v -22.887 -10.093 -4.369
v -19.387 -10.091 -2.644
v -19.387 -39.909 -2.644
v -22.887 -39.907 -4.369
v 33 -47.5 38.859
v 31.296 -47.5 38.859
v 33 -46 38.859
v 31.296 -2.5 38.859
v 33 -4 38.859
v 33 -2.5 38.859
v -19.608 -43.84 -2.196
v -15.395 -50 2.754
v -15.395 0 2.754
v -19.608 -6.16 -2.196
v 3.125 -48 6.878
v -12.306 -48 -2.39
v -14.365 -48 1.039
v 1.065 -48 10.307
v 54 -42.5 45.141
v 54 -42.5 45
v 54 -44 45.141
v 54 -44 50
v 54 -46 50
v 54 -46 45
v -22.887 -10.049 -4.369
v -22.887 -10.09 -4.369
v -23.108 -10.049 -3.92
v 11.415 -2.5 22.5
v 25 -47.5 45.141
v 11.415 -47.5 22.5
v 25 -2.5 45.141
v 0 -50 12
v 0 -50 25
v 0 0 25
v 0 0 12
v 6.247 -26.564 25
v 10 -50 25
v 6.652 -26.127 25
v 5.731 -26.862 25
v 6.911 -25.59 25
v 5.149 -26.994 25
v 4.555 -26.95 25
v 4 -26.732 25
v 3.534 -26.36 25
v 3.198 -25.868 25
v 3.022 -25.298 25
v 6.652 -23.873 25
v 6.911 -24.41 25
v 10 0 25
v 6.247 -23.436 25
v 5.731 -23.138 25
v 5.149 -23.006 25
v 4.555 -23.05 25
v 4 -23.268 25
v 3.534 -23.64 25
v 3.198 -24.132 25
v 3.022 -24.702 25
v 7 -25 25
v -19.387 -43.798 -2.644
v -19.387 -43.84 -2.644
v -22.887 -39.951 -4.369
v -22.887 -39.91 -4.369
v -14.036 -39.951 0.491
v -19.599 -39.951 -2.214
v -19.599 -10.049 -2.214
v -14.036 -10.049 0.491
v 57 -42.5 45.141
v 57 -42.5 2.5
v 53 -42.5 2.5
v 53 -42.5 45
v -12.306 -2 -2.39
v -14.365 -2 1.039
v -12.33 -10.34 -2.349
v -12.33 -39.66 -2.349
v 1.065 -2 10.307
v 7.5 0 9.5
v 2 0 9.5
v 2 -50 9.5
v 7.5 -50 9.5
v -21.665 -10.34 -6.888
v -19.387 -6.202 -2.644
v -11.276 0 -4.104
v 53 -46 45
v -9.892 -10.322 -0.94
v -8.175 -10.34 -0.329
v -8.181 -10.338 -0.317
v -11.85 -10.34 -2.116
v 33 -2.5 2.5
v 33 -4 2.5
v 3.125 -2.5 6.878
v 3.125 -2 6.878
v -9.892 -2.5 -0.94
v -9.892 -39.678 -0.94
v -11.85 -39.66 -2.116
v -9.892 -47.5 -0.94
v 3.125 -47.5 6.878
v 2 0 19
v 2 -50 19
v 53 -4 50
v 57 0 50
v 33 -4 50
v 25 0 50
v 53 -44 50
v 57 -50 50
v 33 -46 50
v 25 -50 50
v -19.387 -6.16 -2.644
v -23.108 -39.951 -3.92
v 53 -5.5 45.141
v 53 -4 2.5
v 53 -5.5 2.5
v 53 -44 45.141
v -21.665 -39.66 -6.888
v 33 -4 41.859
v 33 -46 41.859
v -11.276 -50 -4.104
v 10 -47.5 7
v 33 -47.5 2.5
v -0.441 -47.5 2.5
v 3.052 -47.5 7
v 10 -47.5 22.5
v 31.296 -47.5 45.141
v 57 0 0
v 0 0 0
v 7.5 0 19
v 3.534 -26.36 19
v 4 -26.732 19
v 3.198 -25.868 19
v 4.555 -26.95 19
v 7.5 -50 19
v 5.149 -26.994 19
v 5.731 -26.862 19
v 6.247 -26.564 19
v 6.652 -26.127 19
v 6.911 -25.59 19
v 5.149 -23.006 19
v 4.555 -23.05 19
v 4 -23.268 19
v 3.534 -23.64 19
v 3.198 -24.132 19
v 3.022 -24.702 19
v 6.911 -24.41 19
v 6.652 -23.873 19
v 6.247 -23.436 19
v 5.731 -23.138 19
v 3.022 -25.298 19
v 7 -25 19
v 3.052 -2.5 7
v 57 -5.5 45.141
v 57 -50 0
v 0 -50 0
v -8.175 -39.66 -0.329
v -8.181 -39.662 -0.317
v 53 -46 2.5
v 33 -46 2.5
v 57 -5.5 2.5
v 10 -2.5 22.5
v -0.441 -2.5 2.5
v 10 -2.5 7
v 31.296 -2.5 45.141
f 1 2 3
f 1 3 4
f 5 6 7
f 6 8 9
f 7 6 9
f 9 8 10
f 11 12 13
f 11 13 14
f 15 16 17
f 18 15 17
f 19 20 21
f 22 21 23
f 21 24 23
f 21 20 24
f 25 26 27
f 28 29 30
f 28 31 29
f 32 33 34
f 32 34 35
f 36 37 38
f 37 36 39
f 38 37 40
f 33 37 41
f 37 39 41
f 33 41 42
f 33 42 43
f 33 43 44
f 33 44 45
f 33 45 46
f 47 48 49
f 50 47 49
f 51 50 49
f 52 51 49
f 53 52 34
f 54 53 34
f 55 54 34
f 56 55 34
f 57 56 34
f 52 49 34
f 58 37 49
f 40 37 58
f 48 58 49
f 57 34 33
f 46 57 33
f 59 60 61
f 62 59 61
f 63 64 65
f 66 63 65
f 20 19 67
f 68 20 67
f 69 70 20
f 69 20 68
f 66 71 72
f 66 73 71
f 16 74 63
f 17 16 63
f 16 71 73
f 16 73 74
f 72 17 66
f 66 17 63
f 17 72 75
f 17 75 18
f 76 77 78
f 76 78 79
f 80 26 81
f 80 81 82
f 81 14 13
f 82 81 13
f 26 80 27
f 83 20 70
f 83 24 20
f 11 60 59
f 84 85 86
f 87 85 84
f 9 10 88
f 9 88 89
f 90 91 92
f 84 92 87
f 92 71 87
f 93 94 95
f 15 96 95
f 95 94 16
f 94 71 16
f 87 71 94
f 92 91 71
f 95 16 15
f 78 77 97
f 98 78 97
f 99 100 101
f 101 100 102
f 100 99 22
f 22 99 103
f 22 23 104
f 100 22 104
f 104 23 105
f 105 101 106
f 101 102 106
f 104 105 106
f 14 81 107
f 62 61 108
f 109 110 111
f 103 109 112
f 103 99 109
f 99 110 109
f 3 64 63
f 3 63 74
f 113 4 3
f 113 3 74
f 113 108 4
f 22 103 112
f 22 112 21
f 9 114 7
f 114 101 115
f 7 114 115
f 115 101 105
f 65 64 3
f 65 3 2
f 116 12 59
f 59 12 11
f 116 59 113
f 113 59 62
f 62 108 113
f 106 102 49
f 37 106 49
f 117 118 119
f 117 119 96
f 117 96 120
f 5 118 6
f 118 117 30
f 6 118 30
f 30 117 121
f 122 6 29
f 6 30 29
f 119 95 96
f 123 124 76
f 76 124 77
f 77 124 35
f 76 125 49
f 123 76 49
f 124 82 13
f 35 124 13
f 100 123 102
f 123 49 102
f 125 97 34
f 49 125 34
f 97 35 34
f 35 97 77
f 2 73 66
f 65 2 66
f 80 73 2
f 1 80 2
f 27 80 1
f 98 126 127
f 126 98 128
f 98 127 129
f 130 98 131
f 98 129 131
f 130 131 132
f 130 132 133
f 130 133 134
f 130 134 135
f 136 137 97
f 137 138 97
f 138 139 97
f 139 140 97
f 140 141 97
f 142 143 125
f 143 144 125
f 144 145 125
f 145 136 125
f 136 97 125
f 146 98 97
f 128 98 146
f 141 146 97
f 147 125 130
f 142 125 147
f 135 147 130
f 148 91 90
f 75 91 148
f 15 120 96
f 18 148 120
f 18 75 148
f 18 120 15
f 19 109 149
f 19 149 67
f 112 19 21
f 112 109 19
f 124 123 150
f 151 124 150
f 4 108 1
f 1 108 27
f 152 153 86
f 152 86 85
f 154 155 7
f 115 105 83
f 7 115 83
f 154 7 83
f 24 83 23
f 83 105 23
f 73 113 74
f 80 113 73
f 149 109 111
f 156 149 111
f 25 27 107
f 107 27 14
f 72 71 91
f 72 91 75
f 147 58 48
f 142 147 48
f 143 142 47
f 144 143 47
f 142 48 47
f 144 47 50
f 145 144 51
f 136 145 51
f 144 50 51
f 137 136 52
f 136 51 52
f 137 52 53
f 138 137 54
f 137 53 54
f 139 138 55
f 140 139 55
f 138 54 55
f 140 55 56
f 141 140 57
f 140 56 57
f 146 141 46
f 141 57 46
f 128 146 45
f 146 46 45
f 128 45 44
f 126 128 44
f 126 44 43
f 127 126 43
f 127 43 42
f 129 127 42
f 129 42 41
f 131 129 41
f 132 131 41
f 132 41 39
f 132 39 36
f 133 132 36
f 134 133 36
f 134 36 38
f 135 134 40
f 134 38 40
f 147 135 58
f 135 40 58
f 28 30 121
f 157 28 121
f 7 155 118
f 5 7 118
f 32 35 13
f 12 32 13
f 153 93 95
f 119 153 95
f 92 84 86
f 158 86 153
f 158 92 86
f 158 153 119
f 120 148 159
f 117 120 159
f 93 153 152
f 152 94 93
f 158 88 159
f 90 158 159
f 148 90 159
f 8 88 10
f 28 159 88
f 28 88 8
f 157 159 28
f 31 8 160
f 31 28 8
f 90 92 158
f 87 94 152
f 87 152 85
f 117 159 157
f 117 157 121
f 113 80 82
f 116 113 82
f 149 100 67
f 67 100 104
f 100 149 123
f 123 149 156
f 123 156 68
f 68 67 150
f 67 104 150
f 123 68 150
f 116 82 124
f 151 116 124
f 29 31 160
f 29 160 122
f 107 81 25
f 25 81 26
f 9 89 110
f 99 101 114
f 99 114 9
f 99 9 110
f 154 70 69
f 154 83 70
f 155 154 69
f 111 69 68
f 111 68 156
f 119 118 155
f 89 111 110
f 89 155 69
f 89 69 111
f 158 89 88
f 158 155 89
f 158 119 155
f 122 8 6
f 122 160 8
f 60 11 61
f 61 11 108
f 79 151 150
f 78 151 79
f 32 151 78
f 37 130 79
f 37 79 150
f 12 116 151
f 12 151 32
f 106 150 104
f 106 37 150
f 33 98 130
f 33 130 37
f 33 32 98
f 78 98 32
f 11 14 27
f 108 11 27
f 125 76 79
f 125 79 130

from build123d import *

# Parameters (mm, degrees)
F0_W      = 5.5
F0_H      = 9.5
F1_DEPTH  = 50
F2_T      = -2.5
F3_W      = 46
F3_H      = 4
F4_DEPTH  = 18
F5_DEPTH  = 30
F6_W      = 2
F6_H      = 3
F7_DEPTH  = 42.640873421
F8_W      = 20
F8_H      = 42
F9_DEPTH  = 4.859126579
F10_W     = 1.7037652433
F10_H     = 3.2813884318
F11_DEPTH = 45
F12_W     = 1
F12_H     = 2
F13_DEPTH = 5
F14_DEPTH = 42.640873421
F15_DEPTH = 5
F16_DEPTH = 3
F17_DEPTH = 2
F20_DEPTH = 50
F21_DEPTH = 25
F22_DEPTH = 15
F23_DEPTH = 0.5
F24_DEPTH = 3
F25_DEPTH = 2
F26_R     = 2
F27_DEPTH = 6


with BuildPart() as f1:
    # F0 (on Front) → F1 (new body)
    with BuildSketch(Plane.XZ):
        Polygon((0, 12), (0, 0), (20, 0), (20, 25), (10, 25), (0, 25), align=None)
        with Locations((4.75, 14.25)):
            Rectangle(F0_W, F0_H, mode=Mode.SUBTRACT)
        Polygon((20, 25), (20, 0), (25, 0), (25, 50), (10, 25), align=None)
        Polygon((-11.2763114494, -4.1042417199), (0, 0), (0, 12), (-15.3952030634, 2.7539454948), align=None)
    extrude(amount=F1_DEPTH)

    # F2
    f2_openings = [f1.faces().sort_by_distance(p)[0] for p in [
        (25, -25, 25),
    ]]
    offset(amount=F2_T, openings=f2_openings, kind=Kind.INTERSECTION)

    # F3 (on face) → F4 (cut)
    with BuildSketch(Plane(origin=(-10.0986787248, 0, -6.0650667312), x_dir=(0, -1, 0), z_dir=(-0.8572734018, 0, -0.5148614518))):
        with Locations((25, 6.2872808221)):
            Rectangle(F3_W, F3_H)
    extrude(amount=-F4_DEPTH, mode=Mode.SUBTRACT)

    # F5 (add): a face of the model
    f5_faces = [f1.faces().sort_by_distance(p)[0] for p in [
        (25, -25, 0.7071067812),
    ]]
    extrude(f5_faces, amount=F5_DEPTH)

    # F6 (on face) → F7 (join, through all)
    with BuildSketch(Plane(origin=(0, 0, 45.140873421), x_dir=(1, 0, 0), z_dir=(0, 0, -1))):
        with Locations((54, 46)):
            Rectangle(F6_W, F6_H)
        with Locations((54, 4)):
            Rectangle(F6_W, F6_H)
    extrude(amount=F7_DEPTH)

    # F8 (on face) → F9 (cut, through all)
    with BuildSketch(Plane.XY.offset(50)):
        with Locations((43, -25)):
            Rectangle(F8_W, F8_H)
    extrude(amount=-F9_DEPTH, mode=Mode.SUBTRACT)

    # F10 (on face) → F11 (join, through all)
    with BuildSketch(Plane.XZ.offset(2.5)):
        with Locations((32.1481173784, 43.5001792051)):
            Rectangle(F10_W, F10_H)
    extrude(amount=F11_DEPTH)

    # F12 (on face) → F13 (cut)
    with BuildSketch(Plane.XY.offset(50)):
        with Locations((53.5, -45)):
            Rectangle(F12_W, F12_H)
    extrude(amount=-F13_DEPTH, mode=Mode.SUBTRACT)

    # F14 (add, through all): faces of the model
    f14_faces = [f1.faces().sort_by_distance(p)[0] for p in [
        (43, -46.75, 45.140873421),
        (43, -3.25, 45.140873421),
    ]]
    extrude(f14_faces, amount=F14_DEPTH)

    # F15 (add): a face of the model
    f15_faces = [f1.faces().sort_by_distance(p)[0] for p in [
        (55, -25, 0.7071067812),
    ]]
    extrude(f15_faces, amount=F15_DEPTH)

    # F16 (add): a face of the model
    f16_faces = [f1.faces().sort_by_distance(p)[0] for p in [
        (32.1481173784, -25, 41.8594849892),
    ]]
    extrude(f16_faces, amount=F16_DEPTH)

    # F17 (add): a face of the model
    f17_faces = [f1.faces().sort_by_distance(p)[0] for p in [
        (56.5014165477, -44.5, 23.810402831),
    ]]
    extrude(f17_faces, amount=F17_DEPTH)

    # F19 (on face) → F20 (join)
    with BuildSketch(Plane.XZ.offset(50)):
        Polygon((-11.2763114494, -4.1042417199), (-15.3952030634, 2.7539454948), (-19.6083863192, -2.1957097309), (-23.1083863192, -3.9201829974), (-21.6654660693, -6.8880073104), align=None)
    extrude(amount=-F20_DEPTH)

    # F18 (on face) → F21 (cut)
    with BuildSketch(Plane(origin=(-5.2965243386, 0, 8.819012226), x_dir=(0.8572734018, 0, 0.5148614518), z_dir=(-0.5148614518, 0, 0.8572734018))):
        Polygon((-33.7799977267, -50), (-11.7799977267, -50), (-33.7799977267, -28), align=None)
        Polygon((-33.7799977267, -22), (-11.7799977267, 0), (-33.7799977267, 0), align=None)
    extrude(amount=-F21_DEPTH, mode=Mode.SUBTRACT)

    # F22 (cut): a face of the model
    f22_faces = [f1.faces().sort_by_distance(p)[0] for p in [
        (-22.3892898276, -25, -5.3992335904),
    ]]
    extrude(f22_faces, amount=-F22_DEPTH, mode=Mode.SUBTRACT)

    # F23 (add): a face of the model
    f23_faces = [f1.faces().sort_by_distance(p)[0] for p in [
        (-21.2912627093, -25, -3.0248741153),
    ]]
    extrude(f23_faces, amount=-F23_DEPTH)

    # F24 (cut): a face of the model
    f24_faces = [f1.faces().sort_by_distance(p)[0] for p in [
        (60, -25, 0.7071067812),
    ]]
    extrude(f24_faces, amount=-F24_DEPTH, mode=Mode.SUBTRACT)

    # F25 (add): a face of the model
    f25_faces = [f1.faces().sort_by_distance(p)[0] for p in [
        (6.25, -25, 21.5),
    ]]
    extrude(f25_faces, amount=F25_DEPTH)

    # F26 (on face) → F27 (cut)
    with BuildSketch(Plane.XY.offset(25)):
        with Locations((5, -25)):
            Circle(F26_R)
    extrude(amount=-F27_DEPTH, mode=Mode.SUBTRACT)


solid = f1.part
